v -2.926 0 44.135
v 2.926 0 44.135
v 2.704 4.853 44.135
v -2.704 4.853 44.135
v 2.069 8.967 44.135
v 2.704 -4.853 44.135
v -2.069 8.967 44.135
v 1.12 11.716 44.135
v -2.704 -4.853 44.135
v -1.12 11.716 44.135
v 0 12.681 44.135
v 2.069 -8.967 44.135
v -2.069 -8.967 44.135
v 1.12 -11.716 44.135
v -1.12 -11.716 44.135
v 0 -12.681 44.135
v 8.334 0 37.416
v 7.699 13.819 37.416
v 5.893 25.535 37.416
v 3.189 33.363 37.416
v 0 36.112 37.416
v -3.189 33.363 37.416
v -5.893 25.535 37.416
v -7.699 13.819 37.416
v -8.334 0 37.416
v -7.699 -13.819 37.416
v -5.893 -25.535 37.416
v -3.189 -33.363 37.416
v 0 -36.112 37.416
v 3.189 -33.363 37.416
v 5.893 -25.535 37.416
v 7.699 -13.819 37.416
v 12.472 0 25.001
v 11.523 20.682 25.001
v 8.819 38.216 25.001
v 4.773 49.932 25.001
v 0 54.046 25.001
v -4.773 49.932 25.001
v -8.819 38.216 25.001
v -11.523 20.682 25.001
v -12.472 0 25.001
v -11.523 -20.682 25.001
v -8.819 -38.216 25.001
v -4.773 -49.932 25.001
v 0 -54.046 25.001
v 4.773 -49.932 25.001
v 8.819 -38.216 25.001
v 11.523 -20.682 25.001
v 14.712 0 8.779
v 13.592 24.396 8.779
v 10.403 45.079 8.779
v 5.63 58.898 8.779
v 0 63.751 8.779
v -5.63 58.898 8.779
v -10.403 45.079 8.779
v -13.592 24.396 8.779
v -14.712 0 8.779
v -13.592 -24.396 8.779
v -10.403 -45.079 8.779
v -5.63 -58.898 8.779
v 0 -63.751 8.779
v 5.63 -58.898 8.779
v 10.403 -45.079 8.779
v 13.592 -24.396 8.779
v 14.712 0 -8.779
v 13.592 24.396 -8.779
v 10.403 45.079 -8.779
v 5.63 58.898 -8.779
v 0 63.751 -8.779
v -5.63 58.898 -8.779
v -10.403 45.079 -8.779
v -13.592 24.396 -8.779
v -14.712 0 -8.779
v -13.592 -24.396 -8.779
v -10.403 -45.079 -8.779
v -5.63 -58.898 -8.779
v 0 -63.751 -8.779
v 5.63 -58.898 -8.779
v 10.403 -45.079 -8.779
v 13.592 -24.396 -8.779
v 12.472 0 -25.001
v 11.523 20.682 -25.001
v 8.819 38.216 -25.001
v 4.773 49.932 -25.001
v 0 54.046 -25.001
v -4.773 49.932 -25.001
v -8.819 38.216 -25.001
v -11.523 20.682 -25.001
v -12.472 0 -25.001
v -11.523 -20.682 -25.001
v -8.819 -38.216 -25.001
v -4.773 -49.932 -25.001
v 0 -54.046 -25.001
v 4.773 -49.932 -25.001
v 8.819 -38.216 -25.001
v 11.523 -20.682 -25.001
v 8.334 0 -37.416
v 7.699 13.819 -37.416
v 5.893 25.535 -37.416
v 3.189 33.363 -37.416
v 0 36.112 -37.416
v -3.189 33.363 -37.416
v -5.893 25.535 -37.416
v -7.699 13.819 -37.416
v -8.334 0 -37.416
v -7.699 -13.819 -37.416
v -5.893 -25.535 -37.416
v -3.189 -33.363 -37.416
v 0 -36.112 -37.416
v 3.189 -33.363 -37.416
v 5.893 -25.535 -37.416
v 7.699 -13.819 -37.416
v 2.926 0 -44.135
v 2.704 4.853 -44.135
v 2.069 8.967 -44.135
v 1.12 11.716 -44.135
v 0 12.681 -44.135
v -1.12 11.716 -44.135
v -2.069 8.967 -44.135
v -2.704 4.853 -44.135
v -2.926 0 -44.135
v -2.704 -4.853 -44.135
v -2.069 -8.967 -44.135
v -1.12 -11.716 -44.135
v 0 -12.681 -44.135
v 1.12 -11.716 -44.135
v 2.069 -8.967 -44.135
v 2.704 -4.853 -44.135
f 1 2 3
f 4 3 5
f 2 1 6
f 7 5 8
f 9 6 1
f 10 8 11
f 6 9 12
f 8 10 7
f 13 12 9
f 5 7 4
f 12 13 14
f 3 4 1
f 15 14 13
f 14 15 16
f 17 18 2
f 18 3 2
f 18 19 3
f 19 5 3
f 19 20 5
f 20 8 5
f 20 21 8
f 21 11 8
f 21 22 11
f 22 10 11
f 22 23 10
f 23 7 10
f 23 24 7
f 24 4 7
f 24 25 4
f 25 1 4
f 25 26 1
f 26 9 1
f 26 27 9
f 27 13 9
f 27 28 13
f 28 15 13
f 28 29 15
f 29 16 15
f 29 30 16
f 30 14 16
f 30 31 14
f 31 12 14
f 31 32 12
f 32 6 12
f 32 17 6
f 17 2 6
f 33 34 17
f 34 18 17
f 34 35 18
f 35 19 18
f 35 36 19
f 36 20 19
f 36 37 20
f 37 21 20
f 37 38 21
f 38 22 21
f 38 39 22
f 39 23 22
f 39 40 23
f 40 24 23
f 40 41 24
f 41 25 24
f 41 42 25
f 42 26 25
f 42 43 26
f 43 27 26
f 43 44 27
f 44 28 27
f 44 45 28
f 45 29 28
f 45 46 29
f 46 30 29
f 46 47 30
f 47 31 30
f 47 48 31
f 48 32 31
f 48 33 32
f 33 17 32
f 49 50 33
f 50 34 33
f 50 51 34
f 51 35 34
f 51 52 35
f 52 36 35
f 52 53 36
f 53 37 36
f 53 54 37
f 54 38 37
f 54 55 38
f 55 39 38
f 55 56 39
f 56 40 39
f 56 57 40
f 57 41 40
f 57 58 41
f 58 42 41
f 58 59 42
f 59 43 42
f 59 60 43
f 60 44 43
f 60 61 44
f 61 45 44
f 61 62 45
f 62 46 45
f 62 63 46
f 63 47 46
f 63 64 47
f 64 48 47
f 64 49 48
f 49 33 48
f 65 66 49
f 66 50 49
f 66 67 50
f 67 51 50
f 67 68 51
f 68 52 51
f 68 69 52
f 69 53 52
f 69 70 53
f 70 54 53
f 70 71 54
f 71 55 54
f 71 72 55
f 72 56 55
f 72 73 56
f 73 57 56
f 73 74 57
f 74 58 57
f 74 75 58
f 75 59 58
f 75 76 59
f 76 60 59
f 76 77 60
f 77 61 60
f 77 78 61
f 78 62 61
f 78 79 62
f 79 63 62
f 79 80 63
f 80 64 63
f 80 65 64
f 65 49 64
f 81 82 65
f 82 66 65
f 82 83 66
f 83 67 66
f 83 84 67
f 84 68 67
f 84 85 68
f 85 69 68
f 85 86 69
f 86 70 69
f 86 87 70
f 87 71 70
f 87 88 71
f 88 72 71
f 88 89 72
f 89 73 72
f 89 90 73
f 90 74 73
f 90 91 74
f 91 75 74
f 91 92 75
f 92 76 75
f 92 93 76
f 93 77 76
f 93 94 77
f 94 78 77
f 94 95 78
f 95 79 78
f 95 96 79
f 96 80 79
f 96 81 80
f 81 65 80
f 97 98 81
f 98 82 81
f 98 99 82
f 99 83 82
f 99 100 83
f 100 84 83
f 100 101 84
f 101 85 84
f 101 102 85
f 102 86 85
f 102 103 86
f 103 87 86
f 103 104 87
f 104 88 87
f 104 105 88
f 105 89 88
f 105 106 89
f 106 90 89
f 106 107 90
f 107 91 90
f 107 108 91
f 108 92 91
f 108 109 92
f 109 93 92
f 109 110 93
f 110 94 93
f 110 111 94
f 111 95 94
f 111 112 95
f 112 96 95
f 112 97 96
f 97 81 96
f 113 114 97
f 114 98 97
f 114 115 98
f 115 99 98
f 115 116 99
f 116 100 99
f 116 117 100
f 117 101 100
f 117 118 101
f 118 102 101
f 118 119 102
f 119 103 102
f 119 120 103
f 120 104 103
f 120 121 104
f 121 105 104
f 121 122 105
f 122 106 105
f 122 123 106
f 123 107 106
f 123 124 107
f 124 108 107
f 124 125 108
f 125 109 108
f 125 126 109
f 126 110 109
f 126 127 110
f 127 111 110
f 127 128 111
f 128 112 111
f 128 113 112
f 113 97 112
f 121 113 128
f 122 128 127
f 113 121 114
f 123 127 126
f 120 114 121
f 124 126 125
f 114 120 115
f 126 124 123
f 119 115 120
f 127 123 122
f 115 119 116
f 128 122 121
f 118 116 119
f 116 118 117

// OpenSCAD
// Generated by SolidPython 1.0.1 on 2020-07-29 00:46:45


scale(v = [3, 13, 9]) {
	sphere(r = 5);
}
/***********************************************
*********      SolidPython code:      **********
************************************************
 
# import packages: SolidPython
from solid import *
from solid.utils import *
from itertools import chain, combinations, permutations


class Resize:

    def __init__(self, scad_file):
        self.scad_file = scad_file
        #self.scad_file = import_scad(scad_file)
        # cone/cylinder param:
        self.r1 = 0
        self.r2 = 0
        self.h = 0
        # rectangular prism param:
        self.w = 0
        self.l = 0
        # ellipse param:
        self.r = 0

    # import OpenScad code (file name corresponds to shape)


    # classify shape + parameters
    def assign(self, param1, param2, param3):
        if self.scad_file == 'cone.scad':
            self.r1 = param1
            self.r2 = param2
            self.h = param3
        elif self.scad_file == 'cylinder.scad':
            self.r1 = param1
            self.r2 = param2
            self.h = param3
        elif self.scad_file == 'rectangularPrism.scad':
            self.h = param1
            self.l = param2
            self.w = param3
        else:
            self.r = param1
            self.h = param2

    # resize parameters
    def iterate(self):
        x = range(3, 20, 2)
        i = 1
        if self.scad_file == 'cone.scad':
            tempList = list(permutations(x, 2))
            for temp in tempList:
                param1 = temp[0]
                param2 = temp[1]
                filepath = 'produced_scad_files/' + 'cone' + str(param1) + '_' + str(param2) + '_' + '.scad'
                scad_render_to_file(cylinder(h=param1, r1=param2, r2=0), filepath)

        elif self.scad_file == 'cylinder.scad':
            tempList = list(permutations(x, 3))
            for temp in tempList:
                param1 = temp[0]
                param2 = temp[1]
                filepath = 'produced_scad_files/' + 'cylinder' + str(param1) + '_' + str(param2) + '_' + '.scad'
                scad_render_to_file(cylinder(h=param1, r1=param2, r2=param2), filepath)

        elif self.scad_file == 'rectangularPrism.scad':
            tempList = list(permutations(x, 3))
            for temp in tempList:
                param1 = temp[0]
                param2 = temp[1]
                param3 = temp[2]
                filepath = 'produced_scad_files/' + 'rectangularPrism' + str(param1) + '_' + str(param2) + '_' + str(
                    param3) + '.scad'
                scad_render_to_file(cube(size=(param1, param2, param3)), filepath)

        elif self.scad_file == 'ellipse.scad':
            tempList = list(permutations(x, 4))
            for temp in tempList:
                param1 = temp[0]
                param2 = temp[1]
                param3 = temp[2]
                param4 = temp[3]
                filepath = 'produced_scad_files/' + 'ellipse' + str(param1) + '_' + str(param2) + '_' + str(param3) + '_' + str(param4) + '.scad'
                scad_render_to_file(scale([param1, param2, param3])(sphere(r=param4)), filepath)

    def render_to_scadfile(self):
        scad_render_to_file(scad, 'example.scad') 
 
************************************************/
